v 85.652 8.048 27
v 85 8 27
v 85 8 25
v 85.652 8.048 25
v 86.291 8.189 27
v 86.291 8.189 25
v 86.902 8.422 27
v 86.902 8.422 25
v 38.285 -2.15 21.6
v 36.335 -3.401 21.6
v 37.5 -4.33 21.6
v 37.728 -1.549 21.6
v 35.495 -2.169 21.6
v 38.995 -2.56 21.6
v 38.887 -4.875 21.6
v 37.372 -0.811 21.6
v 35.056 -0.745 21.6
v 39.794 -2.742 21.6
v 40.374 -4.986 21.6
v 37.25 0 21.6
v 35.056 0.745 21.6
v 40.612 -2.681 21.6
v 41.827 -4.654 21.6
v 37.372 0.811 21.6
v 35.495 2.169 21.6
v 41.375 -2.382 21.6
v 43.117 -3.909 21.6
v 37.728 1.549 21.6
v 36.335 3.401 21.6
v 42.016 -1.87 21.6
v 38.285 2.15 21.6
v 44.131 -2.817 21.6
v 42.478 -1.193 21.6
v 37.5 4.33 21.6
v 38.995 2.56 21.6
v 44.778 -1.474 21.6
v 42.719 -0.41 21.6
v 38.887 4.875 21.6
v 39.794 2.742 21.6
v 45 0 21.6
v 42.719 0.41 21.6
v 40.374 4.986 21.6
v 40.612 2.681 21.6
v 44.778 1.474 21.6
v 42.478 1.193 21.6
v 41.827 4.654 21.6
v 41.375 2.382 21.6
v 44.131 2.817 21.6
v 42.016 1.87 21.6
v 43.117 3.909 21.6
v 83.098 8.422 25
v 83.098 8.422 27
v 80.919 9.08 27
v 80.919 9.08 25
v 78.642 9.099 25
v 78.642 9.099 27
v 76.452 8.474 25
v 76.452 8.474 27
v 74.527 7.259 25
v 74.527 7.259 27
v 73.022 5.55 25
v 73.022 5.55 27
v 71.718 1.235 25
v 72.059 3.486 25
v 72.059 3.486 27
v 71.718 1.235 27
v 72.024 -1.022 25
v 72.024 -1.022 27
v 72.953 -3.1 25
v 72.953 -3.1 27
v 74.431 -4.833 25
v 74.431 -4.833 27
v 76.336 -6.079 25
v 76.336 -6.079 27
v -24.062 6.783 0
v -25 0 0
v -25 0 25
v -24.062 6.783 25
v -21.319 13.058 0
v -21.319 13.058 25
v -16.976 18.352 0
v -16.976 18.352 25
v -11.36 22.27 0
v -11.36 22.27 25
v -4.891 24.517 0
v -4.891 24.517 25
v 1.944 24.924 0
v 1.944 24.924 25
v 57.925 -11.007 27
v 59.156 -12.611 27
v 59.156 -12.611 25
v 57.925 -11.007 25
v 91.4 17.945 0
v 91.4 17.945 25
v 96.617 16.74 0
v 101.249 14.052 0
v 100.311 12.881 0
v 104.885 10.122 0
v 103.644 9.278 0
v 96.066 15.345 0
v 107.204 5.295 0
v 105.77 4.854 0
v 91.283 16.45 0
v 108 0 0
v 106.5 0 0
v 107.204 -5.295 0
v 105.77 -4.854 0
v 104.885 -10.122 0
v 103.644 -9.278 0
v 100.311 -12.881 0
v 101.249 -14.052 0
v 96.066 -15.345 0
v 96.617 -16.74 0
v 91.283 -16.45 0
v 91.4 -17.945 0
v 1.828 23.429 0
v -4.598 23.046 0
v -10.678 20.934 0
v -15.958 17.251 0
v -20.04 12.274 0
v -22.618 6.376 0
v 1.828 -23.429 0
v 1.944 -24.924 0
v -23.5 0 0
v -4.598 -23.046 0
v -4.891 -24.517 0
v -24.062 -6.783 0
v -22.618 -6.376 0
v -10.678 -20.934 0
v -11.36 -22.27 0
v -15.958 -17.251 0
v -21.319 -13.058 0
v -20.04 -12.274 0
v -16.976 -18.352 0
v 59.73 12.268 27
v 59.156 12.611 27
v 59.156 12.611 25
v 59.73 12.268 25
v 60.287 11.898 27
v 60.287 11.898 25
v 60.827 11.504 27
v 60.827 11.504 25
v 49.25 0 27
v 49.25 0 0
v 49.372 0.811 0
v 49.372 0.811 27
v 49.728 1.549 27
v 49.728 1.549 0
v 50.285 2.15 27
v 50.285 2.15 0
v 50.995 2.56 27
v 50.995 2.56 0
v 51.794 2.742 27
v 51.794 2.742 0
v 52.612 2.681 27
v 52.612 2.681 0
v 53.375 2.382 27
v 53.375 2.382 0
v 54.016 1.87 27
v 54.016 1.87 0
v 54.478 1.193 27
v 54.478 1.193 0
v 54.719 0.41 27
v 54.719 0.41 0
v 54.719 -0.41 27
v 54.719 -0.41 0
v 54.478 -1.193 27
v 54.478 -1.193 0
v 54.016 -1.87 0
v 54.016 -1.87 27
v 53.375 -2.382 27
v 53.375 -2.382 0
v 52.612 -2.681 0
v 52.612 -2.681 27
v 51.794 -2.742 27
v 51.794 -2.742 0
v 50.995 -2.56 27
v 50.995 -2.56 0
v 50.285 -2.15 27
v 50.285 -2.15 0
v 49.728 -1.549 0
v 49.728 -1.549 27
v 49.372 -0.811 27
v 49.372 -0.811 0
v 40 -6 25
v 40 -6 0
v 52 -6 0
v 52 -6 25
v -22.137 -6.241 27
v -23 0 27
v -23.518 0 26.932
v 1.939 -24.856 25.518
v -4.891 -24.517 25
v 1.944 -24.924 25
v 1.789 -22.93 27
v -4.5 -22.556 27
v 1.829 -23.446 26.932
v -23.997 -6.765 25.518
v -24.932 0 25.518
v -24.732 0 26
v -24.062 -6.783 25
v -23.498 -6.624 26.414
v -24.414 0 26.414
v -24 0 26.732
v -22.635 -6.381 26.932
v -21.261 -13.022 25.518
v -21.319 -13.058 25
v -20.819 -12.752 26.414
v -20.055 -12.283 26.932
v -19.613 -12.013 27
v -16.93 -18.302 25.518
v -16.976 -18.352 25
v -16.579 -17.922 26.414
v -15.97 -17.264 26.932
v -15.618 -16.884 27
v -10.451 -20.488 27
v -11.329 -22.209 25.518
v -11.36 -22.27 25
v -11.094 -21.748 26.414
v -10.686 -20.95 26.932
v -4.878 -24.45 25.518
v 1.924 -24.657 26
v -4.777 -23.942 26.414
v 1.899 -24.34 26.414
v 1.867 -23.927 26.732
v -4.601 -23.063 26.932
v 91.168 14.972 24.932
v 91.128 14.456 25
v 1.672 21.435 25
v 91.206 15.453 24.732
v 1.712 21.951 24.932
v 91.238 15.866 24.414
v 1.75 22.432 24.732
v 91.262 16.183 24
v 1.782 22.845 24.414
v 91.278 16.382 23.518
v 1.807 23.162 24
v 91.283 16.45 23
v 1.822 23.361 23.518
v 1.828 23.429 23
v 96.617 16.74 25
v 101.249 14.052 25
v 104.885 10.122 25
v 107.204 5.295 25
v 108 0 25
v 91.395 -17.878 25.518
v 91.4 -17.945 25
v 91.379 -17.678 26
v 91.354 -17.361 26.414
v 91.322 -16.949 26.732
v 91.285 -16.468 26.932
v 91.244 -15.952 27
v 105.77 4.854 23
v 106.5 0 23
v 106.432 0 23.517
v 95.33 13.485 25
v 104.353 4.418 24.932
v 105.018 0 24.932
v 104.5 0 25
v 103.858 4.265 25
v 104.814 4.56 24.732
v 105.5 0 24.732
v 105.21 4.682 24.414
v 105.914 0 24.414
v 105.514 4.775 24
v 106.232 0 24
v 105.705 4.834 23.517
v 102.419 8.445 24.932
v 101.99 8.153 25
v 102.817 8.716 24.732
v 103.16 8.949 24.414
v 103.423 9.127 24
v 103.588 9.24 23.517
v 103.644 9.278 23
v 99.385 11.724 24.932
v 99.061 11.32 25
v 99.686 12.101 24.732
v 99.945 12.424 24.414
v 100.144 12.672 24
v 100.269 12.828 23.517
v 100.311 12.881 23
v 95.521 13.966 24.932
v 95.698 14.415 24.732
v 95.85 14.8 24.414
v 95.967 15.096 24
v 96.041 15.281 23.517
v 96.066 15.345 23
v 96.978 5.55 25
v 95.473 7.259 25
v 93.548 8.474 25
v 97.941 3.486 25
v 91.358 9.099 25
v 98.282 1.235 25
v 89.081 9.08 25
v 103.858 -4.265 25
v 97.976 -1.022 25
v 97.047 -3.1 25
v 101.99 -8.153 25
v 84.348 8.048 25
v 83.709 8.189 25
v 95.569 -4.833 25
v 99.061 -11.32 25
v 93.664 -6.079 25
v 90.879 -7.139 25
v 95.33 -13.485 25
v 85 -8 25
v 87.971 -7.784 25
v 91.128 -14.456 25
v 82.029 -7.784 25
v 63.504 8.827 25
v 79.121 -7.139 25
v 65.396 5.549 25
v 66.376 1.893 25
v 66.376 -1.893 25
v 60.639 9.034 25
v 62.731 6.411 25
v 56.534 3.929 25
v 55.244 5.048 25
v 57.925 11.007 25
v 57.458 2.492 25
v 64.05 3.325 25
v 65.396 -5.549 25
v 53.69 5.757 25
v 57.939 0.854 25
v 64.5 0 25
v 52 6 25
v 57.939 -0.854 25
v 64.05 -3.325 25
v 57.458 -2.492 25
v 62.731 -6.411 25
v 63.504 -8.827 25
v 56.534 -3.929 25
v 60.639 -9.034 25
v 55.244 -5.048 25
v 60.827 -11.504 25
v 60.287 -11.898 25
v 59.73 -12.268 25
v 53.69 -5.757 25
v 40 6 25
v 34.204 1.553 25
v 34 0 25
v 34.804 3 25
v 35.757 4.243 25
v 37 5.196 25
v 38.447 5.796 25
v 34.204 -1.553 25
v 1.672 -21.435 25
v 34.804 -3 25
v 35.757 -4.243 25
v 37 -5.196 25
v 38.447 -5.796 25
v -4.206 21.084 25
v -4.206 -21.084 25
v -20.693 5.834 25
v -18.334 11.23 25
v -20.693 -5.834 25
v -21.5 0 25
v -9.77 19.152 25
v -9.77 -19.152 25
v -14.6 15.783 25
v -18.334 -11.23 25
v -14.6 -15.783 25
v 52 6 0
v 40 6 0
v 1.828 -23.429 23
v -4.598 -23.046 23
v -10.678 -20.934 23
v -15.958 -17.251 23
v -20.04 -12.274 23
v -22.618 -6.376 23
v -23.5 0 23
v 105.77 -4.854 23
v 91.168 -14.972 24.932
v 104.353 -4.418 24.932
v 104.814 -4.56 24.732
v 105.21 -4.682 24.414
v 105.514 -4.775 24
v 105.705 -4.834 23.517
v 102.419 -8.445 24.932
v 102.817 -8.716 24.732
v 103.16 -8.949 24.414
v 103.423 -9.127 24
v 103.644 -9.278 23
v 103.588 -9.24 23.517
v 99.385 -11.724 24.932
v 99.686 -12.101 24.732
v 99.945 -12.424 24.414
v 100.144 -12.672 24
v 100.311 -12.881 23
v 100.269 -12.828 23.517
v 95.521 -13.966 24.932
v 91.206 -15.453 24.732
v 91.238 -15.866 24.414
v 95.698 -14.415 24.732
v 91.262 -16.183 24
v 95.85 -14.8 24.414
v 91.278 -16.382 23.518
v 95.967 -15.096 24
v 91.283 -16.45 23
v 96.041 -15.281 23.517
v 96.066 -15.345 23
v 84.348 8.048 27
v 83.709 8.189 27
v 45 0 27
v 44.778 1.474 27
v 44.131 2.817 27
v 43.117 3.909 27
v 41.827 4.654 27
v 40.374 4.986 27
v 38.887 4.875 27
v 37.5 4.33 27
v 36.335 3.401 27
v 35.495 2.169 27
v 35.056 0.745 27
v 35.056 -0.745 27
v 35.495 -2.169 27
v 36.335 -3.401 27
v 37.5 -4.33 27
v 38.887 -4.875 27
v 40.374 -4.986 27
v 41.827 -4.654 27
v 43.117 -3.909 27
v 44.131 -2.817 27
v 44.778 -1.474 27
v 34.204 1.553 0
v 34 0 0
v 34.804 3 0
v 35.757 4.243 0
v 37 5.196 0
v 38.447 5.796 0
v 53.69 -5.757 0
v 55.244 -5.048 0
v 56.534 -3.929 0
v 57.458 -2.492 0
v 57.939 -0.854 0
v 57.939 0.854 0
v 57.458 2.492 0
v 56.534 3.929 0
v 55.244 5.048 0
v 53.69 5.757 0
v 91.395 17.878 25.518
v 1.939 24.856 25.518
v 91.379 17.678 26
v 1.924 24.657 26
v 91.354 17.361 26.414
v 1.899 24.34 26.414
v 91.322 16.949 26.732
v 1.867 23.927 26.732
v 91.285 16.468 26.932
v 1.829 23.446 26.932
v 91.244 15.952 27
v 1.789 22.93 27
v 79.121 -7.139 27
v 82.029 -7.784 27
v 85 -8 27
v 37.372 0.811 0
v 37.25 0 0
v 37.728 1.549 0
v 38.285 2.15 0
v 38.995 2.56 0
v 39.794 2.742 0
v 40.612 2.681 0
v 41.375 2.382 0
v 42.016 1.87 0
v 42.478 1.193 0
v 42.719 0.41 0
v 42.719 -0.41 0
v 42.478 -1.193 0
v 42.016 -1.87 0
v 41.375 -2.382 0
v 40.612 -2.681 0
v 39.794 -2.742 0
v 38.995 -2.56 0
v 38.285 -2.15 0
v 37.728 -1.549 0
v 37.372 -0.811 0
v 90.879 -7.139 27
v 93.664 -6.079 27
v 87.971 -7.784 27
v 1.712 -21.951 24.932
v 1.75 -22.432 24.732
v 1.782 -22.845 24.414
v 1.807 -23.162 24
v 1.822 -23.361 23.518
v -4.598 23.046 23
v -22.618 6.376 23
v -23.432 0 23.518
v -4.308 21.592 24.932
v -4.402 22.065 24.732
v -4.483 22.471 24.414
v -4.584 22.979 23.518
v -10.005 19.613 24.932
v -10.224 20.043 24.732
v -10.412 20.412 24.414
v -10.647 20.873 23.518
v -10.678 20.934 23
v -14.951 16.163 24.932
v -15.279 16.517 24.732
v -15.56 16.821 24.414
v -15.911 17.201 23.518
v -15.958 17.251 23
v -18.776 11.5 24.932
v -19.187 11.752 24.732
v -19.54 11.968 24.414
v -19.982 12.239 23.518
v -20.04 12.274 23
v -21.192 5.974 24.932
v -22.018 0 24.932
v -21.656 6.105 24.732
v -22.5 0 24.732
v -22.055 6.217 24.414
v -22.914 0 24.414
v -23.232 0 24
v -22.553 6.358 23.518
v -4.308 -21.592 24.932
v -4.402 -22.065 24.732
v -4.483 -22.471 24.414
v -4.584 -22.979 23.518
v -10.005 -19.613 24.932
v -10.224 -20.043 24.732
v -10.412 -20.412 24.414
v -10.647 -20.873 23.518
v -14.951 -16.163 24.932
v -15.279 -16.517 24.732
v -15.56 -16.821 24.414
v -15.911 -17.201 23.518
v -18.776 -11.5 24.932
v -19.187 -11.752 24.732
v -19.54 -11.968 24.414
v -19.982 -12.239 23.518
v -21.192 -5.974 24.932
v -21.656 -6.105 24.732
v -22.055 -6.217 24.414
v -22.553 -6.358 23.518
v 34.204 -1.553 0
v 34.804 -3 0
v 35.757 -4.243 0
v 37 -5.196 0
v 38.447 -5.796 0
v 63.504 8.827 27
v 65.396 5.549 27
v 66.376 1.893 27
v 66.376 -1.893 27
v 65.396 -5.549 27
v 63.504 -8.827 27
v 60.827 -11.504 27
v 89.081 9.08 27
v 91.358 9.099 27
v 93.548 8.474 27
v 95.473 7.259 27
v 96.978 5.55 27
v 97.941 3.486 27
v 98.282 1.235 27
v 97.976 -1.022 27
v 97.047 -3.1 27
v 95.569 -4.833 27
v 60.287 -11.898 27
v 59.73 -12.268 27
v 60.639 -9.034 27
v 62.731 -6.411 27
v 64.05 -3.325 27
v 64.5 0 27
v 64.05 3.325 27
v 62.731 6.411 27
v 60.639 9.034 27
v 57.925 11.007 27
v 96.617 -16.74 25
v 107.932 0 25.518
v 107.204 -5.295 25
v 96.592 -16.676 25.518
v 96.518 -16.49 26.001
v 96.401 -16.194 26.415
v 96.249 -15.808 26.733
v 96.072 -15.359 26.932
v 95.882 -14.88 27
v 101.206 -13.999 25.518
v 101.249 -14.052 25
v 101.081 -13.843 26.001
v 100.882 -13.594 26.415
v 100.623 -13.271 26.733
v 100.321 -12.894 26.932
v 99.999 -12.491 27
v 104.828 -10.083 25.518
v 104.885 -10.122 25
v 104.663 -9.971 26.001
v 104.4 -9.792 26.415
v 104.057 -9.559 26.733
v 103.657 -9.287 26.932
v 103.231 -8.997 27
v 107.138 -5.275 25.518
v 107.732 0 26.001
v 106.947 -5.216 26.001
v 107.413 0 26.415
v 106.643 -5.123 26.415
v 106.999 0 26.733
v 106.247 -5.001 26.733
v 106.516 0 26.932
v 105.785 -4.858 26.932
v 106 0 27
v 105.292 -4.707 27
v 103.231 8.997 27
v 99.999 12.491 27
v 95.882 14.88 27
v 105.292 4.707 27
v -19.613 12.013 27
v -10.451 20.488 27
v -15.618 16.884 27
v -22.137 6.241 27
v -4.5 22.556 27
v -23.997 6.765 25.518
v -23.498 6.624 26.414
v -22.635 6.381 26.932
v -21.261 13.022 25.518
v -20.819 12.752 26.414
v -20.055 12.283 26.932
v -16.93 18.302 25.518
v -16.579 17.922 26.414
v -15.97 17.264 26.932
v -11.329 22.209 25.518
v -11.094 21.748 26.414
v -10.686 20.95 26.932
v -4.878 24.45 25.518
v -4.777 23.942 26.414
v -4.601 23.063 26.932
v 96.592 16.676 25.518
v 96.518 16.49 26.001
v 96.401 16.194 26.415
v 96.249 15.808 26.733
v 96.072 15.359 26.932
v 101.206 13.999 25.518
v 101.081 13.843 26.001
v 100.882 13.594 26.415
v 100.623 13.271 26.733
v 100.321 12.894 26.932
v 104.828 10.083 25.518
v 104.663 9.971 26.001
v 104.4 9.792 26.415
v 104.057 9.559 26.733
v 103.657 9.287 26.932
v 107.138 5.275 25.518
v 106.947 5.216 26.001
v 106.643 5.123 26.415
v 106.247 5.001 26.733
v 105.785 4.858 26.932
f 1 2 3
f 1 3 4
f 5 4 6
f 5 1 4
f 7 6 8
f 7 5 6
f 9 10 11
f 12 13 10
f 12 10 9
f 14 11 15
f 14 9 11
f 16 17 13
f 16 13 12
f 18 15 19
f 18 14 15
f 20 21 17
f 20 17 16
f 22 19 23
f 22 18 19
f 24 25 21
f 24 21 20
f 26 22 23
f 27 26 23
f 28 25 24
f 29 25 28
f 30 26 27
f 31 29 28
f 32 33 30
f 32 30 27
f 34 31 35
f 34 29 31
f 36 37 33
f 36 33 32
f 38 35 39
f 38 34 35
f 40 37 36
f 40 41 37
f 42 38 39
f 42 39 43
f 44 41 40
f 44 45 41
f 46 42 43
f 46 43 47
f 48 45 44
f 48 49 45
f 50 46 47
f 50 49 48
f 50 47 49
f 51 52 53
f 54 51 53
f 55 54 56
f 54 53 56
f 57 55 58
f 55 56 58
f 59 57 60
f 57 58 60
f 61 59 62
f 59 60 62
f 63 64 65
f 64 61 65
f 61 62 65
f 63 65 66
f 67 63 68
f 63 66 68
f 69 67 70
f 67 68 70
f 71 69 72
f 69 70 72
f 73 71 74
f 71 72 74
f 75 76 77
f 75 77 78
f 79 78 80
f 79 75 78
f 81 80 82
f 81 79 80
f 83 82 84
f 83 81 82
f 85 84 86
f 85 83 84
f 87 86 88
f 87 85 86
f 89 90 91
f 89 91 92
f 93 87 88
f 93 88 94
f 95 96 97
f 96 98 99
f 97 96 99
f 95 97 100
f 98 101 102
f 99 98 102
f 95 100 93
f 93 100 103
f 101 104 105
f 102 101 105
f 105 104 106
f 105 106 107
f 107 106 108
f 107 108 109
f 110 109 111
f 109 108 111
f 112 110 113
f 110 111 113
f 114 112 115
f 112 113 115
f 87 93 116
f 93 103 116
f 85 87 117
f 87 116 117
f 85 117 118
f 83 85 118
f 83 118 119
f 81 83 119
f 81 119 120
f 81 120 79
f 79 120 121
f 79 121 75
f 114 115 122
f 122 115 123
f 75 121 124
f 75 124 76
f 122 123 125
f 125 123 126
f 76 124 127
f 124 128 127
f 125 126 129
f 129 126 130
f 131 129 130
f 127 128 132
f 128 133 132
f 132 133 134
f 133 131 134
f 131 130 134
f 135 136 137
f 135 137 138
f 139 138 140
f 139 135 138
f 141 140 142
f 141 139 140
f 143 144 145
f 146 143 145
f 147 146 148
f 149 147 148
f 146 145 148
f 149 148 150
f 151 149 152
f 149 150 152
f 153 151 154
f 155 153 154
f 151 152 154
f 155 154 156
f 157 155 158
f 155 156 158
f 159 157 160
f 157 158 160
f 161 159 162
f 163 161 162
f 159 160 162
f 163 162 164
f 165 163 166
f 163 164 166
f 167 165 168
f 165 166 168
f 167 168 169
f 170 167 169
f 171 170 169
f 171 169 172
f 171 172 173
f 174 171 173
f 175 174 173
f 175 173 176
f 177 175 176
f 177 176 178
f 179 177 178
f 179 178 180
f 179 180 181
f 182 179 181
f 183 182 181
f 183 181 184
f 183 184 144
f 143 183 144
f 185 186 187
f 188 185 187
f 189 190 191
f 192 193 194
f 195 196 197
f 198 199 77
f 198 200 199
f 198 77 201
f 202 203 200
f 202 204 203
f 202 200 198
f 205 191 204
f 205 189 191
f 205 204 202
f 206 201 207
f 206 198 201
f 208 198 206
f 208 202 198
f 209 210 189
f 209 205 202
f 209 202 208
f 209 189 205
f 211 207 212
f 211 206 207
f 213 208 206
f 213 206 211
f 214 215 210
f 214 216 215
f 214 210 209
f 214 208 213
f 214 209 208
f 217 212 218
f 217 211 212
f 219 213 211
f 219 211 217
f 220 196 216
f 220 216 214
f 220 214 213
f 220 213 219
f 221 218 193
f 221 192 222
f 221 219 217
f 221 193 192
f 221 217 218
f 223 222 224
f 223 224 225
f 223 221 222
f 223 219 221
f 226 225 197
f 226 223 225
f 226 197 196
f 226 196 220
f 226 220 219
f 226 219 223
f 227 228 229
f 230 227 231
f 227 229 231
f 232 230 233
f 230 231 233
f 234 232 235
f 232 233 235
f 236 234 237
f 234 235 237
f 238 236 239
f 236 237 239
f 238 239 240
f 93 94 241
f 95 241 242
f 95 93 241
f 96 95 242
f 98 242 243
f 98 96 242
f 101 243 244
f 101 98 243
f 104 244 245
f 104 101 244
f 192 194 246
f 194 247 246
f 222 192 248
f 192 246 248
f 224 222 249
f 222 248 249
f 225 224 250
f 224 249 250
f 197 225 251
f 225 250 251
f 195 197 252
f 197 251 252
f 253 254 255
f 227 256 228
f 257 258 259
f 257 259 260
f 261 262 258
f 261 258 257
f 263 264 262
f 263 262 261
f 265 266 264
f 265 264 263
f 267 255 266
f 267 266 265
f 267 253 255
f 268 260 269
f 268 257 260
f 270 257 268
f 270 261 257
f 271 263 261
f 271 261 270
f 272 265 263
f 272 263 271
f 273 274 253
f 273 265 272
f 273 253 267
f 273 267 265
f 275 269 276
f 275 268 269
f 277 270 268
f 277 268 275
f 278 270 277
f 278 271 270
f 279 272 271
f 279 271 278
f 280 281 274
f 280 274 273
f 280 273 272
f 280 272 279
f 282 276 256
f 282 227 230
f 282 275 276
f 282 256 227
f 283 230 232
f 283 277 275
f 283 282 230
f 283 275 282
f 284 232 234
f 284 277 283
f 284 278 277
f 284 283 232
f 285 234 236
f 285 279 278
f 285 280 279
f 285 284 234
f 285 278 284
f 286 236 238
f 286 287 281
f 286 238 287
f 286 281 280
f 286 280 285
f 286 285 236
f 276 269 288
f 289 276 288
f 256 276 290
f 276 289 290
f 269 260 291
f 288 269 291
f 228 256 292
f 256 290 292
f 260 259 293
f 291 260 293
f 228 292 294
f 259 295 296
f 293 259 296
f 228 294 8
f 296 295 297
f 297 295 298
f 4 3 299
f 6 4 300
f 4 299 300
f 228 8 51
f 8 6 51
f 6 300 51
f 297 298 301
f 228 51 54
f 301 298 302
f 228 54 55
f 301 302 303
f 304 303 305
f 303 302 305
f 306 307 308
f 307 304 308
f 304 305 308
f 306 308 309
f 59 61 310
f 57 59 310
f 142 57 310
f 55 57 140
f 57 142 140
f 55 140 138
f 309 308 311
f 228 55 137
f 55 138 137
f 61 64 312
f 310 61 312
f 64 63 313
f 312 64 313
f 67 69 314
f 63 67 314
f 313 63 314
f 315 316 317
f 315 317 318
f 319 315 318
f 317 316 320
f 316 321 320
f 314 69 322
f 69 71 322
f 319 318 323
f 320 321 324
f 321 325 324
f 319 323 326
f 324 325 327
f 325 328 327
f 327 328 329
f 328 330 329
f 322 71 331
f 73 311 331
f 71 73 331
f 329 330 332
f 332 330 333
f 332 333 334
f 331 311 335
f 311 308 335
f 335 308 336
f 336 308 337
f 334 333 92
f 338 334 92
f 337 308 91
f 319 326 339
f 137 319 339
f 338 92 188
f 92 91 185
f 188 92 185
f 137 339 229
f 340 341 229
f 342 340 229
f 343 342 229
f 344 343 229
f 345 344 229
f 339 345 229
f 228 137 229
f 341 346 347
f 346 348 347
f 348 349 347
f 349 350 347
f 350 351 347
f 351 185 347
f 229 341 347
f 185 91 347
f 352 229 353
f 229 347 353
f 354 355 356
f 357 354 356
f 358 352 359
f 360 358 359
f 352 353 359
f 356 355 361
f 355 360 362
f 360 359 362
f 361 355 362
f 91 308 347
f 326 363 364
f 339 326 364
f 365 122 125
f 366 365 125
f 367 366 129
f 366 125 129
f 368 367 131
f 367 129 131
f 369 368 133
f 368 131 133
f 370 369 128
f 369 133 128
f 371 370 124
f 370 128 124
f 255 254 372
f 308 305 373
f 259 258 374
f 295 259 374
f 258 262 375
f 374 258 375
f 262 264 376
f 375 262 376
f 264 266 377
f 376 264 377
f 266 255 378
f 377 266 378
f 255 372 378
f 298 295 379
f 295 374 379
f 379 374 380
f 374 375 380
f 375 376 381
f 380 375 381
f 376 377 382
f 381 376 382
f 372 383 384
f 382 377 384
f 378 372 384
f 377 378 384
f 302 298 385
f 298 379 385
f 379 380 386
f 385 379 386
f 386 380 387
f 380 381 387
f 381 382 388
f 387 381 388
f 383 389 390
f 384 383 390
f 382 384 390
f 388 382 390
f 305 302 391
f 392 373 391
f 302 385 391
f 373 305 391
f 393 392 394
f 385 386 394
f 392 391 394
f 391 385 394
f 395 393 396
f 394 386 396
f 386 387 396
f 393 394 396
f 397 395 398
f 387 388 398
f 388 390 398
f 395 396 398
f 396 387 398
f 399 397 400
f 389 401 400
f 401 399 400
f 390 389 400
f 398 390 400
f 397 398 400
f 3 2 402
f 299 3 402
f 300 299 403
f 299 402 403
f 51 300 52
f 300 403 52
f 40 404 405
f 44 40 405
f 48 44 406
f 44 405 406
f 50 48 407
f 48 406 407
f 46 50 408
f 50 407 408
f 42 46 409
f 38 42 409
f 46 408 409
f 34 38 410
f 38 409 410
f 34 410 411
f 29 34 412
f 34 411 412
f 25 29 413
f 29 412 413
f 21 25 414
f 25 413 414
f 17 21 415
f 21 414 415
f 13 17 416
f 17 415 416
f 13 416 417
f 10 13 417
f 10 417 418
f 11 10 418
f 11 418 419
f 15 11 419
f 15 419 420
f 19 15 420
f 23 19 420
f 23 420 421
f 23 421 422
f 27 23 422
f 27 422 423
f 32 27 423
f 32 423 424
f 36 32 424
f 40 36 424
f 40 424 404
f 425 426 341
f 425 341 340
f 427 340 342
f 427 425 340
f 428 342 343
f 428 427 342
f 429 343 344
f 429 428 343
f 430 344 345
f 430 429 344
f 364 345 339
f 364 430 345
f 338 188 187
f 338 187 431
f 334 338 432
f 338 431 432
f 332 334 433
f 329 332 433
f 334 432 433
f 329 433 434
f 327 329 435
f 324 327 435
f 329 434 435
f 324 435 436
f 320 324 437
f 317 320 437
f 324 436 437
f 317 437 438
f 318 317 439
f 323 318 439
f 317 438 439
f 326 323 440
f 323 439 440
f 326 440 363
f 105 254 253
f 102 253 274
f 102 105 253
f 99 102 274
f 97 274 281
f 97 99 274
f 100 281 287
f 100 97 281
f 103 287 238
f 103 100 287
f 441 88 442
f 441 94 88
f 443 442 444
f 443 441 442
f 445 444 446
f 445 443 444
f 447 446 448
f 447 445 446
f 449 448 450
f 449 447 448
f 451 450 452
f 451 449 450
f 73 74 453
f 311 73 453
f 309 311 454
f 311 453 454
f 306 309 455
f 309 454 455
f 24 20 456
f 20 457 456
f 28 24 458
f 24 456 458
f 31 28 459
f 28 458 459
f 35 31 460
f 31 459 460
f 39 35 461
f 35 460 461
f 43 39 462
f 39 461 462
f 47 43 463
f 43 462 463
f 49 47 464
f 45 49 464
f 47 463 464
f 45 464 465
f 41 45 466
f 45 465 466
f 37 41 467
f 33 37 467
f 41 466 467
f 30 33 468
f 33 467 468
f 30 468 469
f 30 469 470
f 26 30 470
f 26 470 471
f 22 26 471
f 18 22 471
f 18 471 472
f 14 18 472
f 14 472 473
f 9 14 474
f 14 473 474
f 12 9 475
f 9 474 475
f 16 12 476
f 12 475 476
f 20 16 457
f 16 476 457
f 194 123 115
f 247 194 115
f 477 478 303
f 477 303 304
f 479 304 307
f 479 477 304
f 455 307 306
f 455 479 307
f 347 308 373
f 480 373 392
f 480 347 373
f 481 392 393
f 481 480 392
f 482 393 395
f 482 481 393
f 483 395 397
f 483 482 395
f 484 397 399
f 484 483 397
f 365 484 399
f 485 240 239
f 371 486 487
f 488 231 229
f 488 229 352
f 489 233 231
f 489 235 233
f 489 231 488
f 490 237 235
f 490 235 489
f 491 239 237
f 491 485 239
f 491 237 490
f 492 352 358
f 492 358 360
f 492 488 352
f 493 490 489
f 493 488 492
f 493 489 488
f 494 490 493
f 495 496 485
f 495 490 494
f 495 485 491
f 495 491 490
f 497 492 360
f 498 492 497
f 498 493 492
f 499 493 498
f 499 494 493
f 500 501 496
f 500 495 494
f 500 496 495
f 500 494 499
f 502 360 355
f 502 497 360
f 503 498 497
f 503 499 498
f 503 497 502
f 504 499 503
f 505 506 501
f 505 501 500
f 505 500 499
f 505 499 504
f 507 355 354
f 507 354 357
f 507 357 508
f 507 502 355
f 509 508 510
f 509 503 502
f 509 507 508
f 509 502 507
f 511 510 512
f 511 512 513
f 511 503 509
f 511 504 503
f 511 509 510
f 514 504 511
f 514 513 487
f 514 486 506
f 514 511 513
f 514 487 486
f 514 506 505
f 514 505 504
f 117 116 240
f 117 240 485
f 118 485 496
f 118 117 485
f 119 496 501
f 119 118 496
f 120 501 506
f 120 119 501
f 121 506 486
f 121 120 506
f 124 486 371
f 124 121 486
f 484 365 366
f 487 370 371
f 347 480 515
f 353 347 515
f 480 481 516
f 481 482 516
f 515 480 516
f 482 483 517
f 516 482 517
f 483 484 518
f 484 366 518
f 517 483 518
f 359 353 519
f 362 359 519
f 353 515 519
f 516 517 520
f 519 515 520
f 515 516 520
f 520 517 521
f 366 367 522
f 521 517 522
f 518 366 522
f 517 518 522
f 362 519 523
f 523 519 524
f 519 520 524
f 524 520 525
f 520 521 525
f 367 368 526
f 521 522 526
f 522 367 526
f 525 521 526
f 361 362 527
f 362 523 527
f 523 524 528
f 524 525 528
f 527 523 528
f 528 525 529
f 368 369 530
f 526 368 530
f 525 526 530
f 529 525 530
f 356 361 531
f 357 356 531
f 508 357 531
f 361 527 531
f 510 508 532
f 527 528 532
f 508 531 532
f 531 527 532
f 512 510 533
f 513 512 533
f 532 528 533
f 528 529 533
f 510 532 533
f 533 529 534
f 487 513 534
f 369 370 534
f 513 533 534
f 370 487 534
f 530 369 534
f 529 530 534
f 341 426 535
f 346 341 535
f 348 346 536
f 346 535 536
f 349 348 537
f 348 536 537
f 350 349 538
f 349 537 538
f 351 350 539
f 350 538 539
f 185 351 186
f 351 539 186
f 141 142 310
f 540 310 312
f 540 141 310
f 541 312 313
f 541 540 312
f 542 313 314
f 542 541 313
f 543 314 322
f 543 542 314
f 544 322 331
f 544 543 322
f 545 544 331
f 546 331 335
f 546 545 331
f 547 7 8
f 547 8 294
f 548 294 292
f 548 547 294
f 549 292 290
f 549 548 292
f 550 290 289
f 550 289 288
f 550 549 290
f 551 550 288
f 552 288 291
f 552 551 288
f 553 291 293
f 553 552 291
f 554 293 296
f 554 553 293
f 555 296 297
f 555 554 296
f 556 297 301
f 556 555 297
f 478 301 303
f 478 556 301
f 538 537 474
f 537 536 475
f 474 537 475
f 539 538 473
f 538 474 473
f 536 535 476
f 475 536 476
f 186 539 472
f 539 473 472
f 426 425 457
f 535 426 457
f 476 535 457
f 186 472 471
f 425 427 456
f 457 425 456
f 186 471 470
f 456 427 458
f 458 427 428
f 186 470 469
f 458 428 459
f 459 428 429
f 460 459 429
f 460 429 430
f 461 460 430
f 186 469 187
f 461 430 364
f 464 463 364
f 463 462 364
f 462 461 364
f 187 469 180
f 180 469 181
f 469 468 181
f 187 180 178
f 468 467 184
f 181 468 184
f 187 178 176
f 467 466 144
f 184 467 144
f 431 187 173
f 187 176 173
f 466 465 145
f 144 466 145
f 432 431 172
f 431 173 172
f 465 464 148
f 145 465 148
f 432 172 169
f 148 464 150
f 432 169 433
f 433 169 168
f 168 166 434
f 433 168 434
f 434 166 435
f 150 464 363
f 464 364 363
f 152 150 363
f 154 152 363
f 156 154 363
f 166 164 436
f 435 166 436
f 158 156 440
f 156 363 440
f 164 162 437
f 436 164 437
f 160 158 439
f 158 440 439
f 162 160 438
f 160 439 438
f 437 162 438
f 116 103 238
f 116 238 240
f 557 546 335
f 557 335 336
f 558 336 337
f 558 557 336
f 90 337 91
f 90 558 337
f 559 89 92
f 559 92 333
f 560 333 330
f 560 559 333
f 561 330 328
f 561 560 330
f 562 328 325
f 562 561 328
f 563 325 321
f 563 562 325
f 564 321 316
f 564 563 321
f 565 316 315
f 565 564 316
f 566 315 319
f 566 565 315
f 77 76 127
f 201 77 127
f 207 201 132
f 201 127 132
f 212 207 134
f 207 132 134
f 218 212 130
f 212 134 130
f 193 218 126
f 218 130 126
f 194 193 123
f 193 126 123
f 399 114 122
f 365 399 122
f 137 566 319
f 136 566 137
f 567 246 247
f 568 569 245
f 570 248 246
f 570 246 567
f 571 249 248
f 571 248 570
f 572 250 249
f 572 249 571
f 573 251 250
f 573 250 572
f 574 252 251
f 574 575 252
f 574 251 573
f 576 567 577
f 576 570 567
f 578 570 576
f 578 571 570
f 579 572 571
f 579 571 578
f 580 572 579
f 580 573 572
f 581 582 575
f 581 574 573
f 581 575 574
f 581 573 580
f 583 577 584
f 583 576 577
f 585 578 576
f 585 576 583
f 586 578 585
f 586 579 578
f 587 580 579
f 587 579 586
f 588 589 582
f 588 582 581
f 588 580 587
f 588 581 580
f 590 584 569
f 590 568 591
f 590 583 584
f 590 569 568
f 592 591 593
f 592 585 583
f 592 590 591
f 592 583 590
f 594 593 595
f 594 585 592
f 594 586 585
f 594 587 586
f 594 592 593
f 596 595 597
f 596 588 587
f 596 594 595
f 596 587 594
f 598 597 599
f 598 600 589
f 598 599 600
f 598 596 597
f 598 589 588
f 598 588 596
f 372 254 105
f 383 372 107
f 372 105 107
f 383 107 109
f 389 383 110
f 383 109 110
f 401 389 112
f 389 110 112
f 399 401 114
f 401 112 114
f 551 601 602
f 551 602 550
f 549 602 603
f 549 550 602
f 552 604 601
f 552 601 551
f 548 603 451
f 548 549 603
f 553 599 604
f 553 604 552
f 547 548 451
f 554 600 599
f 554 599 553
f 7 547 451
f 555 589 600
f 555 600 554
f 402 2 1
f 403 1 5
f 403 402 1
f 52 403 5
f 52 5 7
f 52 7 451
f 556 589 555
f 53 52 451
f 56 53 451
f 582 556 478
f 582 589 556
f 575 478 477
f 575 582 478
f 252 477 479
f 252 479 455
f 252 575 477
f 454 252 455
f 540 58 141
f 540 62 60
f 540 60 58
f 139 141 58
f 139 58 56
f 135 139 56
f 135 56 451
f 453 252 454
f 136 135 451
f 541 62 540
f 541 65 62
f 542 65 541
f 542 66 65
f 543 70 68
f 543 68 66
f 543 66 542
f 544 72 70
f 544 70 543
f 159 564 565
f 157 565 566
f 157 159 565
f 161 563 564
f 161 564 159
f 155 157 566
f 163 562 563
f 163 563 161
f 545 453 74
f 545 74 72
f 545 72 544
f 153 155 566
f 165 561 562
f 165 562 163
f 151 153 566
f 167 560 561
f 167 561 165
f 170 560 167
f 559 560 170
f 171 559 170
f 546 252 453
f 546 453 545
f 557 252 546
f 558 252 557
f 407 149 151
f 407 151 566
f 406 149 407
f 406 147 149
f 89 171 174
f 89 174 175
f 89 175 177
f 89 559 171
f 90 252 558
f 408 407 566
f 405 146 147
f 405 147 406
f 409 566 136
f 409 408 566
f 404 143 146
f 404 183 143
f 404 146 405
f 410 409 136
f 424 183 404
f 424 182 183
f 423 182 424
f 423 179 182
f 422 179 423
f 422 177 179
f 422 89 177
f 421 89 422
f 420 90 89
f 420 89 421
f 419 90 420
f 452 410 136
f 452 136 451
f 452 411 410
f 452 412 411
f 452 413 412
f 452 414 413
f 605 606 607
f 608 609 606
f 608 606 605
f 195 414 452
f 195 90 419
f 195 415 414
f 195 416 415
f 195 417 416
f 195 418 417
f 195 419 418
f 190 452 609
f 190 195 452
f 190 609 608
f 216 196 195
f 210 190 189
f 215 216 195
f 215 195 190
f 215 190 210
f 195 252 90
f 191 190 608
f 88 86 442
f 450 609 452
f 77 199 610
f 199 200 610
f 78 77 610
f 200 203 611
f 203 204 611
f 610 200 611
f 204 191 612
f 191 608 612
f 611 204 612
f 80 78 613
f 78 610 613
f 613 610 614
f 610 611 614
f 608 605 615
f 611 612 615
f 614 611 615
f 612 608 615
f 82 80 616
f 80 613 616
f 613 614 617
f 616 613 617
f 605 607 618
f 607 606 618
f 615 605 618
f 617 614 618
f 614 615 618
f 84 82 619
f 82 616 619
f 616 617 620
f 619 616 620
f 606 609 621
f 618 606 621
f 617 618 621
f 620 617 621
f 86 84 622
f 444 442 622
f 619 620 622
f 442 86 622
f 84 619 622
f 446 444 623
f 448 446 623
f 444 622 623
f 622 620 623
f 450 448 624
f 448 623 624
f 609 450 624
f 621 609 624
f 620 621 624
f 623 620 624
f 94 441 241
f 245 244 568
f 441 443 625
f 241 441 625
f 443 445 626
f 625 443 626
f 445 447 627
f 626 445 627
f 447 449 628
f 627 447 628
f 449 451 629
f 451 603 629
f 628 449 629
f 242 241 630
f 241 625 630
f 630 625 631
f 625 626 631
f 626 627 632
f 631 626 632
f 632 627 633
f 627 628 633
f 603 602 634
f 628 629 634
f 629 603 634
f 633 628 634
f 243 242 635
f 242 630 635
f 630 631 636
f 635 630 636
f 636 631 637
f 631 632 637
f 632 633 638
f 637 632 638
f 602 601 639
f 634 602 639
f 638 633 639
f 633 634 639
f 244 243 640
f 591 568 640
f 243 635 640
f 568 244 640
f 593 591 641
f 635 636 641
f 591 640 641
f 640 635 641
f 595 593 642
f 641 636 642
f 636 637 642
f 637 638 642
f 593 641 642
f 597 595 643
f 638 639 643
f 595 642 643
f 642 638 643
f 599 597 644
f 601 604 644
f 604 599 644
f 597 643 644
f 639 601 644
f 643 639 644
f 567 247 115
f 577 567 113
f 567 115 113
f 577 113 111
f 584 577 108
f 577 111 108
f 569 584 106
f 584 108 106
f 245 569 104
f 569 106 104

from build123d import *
from build123d.topology import SkipClean

# Parameters (mm, degrees)
AUFSATZ_LINEAR_AUSTRAGEN1_DEPTH                      = 25
AUFSATZ_LINEAR_AUSTRAGEN2_DEPTH                      = 2
VERRUNDUNG1_R                                        = 2
SCHNITT_LINEAR_AUSTRAGEN1_REACH                      = 116.096
AUFSATZ_LINEAR_AUSTRAGEN3_DEPTH                      = 25
SPIEGELN2_DEPTH                                      = 25
STIRNSENKUNG_F_R_M5_ZYLINDERSCHRAUBE_MIT_D           = 5.5
STIRNSENKUNG_F_R_M5_ZYLINDERSCHRAUBE_MIT_CBORE_D     = 10
STIRNSENKUNG_F_R_M5_ZYLINDERSCHRAUBE_MIT_CBORE_DEPTH = 5.4
DURCHGANGSLOCH_F_R_M51_D                             = 5.5
SCHNITT_LINEAR_AUSTRAGEN2_REACH                      = 116.096


# Read off the part's stored shape, not the designer's step: Spiegeln2
with BuildPart() as part:
    # Skizze1 → Aufsatz-Linear austragen1 (new body)
    with BuildSketch(Plane.XY):
        with BuildLine():
            Line((1.944444444, 24.924268009), (91.4, 17.945472967))
            ThreePointArc((91.4, 17.945472967), (103.213629327, 12.222929272), (108, 0))
            Line((108, 0), (106.5, 0))
            ThreePointArc((106.5, 0), (102.11249355, 11.204351833), (91.283333333, 16.450016886))
            Line((91.283333333, 16.450016886), (1.827777778, 23.428811929))
            ThreePointArc((1.827777778, 23.428811929), (-15.957713217, 17.251127177), (-23.5, 0))
            Line((-23.5, 0), (-25, 0))
            ThreePointArc((-25, 0), (-16.976290656, 18.352262955), (1.944444444, 24.924268009))
        make_face()
    extrude(amount=AUFSATZ_LINEAR_AUSTRAGEN1_DEPTH)

    # Skizze2 → Aufsatz-Linear austragen2 (add)
    with BuildSketch(Plane.XY.offset(25)):
        with BuildLine():
            Line((108, 0), (-25, 0))
            ThreePointArc((-25, 0), (-16.976290656, 18.352262955), (1.944444444, 24.924268009))
            Line((1.944444444, 24.924268009), (91.4, 17.945472967))
            ThreePointArc((91.4, 17.945472967), (103.213629327, 12.222929272), (108, 0))
        make_face()
    extrude(amount=AUFSATZ_LINEAR_AUSTRAGEN2_DEPTH)

    # Verrundung1
    verrundung1_edges = [part.edges().sort_by_distance(p)[0] for p in [
        (-15.957713217, 17.251127177, 25),
        (46.555555556, 19.939414407, 25),
        (-16.976290656, 18.352262955, 27),
        (102.11249355, 11.204351833, 25),
        (103.213629327, 12.222929272, 27),
        (46.672222222, 21.434870488, 27),
    ]]
    fillet(verrundung1_edges, radius=VERRUNDUNG1_R)

    # Spiegeln1: part across plane


with BuildPart() as part_1:
    with SkipClean():  # the faces are left unmerged after this step: merging them gives an invalid solid
        add(part.part)
        add(part.part.mirror(Plane.ZX))

    # Skizze11 → Schnitt-Linear austragen1 (cut, up to next)
    with BuildSketch(Plane.XY.offset(27), mode=Mode.PRIVATE) as schnitt_linear_austragen1_sk1:
        with BuildLine():
            Line((85, 0), (85, 8))
            ThreePointArc((85, 8), (85.973978263, 8.106667968), (86.901782178, 8.421614958))
            ThreePointArc((86.901782178, 8.421614958), (97.533190568, 4.552098756), (93.663674366, -6.079309634))
            ThreePointArc((93.663674366, -6.079309634), (89.437012086, -7.514068146), (85, -8))
            Line((85, -8), (85, 0))
        make_face()
    schnitt_linear_austragen1_tool1 = extrude(schnitt_linear_austragen1_sk1.sketch, amount=-SCHNITT_LINEAR_AUSTRAGEN1_REACH, mode=Mode.PRIVATE) & part_1.part
    schnitt_linear_austragen1 = schnitt_linear_austragen1_tool1.solids().sort_by_distance((90.892741, 0.809501, 27))[0]
    add(schnitt_linear_austragen1, mode=Mode.SUBTRACT)

    # Spiegeln3: Schnitt-Linear austragen1 across plane
    with SkipClean():  # the faces are left unmerged after this step: merging them gives an invalid solid
        add(schnitt_linear_austragen1.mirror(Plane(origin=(85, 0, -0.001), x_dir=(0, 0, 1), z_dir=(-1, 0, 0))), mode=Mode.SUBTRACT)

    # Skizze3 → Aufsatz-Linear austragen3 (add)
    with SkipClean():  # the faces are left unmerged after this step: merging them gives an invalid solid
        with BuildSketch(Plane.XY):
            with BuildLine():
                Line((46, 6), (46, 0))
                Line((46, 0), (34, 0))
                ThreePointArc((34, 0), (35.757359313, 4.242640687), (40, 6))
                Line((40, 6), (46, 6))
            make_face()
        extrude(amount=AUFSATZ_LINEAR_AUSTRAGEN3_DEPTH)

    # Spiegeln2 outline → Spiegeln2 (add)
    with SkipClean():  # the faces are left unmerged after this step: merging them gives an invalid solid
        with BuildSketch(Plane.XY):
            with BuildLine():
                Line((52, 6), (46, 6))
                Line((46, 6), (46, 0))
                Line((46, 0), (34, 0))
                ThreePointArc((34, 0), (35.757359313, -4.242640687), (40, -6))
                Line((40, -6), (52, -6))
                ThreePointArc((52, -6), (58, 0), (52, 6))
            make_face()
        extrude(amount=SPIEGELN2_DEPTH)

    # Stirnsenkung für M5 Zylinderschraube mit Innensechskant2 (through all)
    with Locations(Plane.XY.offset(27)):
        with Locations((40, 0)):
            CounterBoreHole(STIRNSENKUNG_F_R_M5_ZYLINDERSCHRAUBE_MIT_D / 2, STIRNSENKUNG_F_R_M5_ZYLINDERSCHRAUBE_MIT_CBORE_D / 2, STIRNSENKUNG_F_R_M5_ZYLINDERSCHRAUBE_MIT_CBORE_DEPTH)

    # Durchgangsloch für M51 (through all)
    with Locations(Plane.XY.offset(27)):
        with Locations((52, 0)):
            Hole(DURCHGANGSLOCH_F_R_M51_D / 2)

    # Skizze12 → Schnitt-Linear austragen2 (cut, up to next)
    with BuildSketch(Plane.XY.offset(27), mode=Mode.PRIVATE) as schnitt_linear_austragen2_sk1:
        with BuildLine():
            Line((59.155963734, -12.611192768), (57.924777873, -11.006680115))
            ThreePointArc((57.924777873, -11.006680115), (64.5, 0), (57.924777873, 11.006680115))
            Line((57.924777873, 11.006680115), (59.155963734, 12.611192768))
            ThreePointArc((59.155963734, 12.611192768), (60.01066697, 12.086323457), (60.827040721, 11.503623434))
            ThreePointArc((60.827040721, 11.503623434), (66.5, 0), (60.827040721, -11.503623434))
            ThreePointArc((60.827040721, -11.503623434), (60.01066697, -12.086323457), (59.155963734, -12.611192768))
        make_face()
    schnitt_linear_austragen2_tool1 = extrude(schnitt_linear_austragen2_sk1.sketch, amount=-SCHNITT_LINEAR_AUSTRAGEN2_REACH, mode=Mode.PRIVATE) & part_1.part
    add(schnitt_linear_austragen2_tool1.solids().sort_by_distance((58.751722, -11.646761, 27))[0], mode=Mode.SUBTRACT)


solid = part_1.part
